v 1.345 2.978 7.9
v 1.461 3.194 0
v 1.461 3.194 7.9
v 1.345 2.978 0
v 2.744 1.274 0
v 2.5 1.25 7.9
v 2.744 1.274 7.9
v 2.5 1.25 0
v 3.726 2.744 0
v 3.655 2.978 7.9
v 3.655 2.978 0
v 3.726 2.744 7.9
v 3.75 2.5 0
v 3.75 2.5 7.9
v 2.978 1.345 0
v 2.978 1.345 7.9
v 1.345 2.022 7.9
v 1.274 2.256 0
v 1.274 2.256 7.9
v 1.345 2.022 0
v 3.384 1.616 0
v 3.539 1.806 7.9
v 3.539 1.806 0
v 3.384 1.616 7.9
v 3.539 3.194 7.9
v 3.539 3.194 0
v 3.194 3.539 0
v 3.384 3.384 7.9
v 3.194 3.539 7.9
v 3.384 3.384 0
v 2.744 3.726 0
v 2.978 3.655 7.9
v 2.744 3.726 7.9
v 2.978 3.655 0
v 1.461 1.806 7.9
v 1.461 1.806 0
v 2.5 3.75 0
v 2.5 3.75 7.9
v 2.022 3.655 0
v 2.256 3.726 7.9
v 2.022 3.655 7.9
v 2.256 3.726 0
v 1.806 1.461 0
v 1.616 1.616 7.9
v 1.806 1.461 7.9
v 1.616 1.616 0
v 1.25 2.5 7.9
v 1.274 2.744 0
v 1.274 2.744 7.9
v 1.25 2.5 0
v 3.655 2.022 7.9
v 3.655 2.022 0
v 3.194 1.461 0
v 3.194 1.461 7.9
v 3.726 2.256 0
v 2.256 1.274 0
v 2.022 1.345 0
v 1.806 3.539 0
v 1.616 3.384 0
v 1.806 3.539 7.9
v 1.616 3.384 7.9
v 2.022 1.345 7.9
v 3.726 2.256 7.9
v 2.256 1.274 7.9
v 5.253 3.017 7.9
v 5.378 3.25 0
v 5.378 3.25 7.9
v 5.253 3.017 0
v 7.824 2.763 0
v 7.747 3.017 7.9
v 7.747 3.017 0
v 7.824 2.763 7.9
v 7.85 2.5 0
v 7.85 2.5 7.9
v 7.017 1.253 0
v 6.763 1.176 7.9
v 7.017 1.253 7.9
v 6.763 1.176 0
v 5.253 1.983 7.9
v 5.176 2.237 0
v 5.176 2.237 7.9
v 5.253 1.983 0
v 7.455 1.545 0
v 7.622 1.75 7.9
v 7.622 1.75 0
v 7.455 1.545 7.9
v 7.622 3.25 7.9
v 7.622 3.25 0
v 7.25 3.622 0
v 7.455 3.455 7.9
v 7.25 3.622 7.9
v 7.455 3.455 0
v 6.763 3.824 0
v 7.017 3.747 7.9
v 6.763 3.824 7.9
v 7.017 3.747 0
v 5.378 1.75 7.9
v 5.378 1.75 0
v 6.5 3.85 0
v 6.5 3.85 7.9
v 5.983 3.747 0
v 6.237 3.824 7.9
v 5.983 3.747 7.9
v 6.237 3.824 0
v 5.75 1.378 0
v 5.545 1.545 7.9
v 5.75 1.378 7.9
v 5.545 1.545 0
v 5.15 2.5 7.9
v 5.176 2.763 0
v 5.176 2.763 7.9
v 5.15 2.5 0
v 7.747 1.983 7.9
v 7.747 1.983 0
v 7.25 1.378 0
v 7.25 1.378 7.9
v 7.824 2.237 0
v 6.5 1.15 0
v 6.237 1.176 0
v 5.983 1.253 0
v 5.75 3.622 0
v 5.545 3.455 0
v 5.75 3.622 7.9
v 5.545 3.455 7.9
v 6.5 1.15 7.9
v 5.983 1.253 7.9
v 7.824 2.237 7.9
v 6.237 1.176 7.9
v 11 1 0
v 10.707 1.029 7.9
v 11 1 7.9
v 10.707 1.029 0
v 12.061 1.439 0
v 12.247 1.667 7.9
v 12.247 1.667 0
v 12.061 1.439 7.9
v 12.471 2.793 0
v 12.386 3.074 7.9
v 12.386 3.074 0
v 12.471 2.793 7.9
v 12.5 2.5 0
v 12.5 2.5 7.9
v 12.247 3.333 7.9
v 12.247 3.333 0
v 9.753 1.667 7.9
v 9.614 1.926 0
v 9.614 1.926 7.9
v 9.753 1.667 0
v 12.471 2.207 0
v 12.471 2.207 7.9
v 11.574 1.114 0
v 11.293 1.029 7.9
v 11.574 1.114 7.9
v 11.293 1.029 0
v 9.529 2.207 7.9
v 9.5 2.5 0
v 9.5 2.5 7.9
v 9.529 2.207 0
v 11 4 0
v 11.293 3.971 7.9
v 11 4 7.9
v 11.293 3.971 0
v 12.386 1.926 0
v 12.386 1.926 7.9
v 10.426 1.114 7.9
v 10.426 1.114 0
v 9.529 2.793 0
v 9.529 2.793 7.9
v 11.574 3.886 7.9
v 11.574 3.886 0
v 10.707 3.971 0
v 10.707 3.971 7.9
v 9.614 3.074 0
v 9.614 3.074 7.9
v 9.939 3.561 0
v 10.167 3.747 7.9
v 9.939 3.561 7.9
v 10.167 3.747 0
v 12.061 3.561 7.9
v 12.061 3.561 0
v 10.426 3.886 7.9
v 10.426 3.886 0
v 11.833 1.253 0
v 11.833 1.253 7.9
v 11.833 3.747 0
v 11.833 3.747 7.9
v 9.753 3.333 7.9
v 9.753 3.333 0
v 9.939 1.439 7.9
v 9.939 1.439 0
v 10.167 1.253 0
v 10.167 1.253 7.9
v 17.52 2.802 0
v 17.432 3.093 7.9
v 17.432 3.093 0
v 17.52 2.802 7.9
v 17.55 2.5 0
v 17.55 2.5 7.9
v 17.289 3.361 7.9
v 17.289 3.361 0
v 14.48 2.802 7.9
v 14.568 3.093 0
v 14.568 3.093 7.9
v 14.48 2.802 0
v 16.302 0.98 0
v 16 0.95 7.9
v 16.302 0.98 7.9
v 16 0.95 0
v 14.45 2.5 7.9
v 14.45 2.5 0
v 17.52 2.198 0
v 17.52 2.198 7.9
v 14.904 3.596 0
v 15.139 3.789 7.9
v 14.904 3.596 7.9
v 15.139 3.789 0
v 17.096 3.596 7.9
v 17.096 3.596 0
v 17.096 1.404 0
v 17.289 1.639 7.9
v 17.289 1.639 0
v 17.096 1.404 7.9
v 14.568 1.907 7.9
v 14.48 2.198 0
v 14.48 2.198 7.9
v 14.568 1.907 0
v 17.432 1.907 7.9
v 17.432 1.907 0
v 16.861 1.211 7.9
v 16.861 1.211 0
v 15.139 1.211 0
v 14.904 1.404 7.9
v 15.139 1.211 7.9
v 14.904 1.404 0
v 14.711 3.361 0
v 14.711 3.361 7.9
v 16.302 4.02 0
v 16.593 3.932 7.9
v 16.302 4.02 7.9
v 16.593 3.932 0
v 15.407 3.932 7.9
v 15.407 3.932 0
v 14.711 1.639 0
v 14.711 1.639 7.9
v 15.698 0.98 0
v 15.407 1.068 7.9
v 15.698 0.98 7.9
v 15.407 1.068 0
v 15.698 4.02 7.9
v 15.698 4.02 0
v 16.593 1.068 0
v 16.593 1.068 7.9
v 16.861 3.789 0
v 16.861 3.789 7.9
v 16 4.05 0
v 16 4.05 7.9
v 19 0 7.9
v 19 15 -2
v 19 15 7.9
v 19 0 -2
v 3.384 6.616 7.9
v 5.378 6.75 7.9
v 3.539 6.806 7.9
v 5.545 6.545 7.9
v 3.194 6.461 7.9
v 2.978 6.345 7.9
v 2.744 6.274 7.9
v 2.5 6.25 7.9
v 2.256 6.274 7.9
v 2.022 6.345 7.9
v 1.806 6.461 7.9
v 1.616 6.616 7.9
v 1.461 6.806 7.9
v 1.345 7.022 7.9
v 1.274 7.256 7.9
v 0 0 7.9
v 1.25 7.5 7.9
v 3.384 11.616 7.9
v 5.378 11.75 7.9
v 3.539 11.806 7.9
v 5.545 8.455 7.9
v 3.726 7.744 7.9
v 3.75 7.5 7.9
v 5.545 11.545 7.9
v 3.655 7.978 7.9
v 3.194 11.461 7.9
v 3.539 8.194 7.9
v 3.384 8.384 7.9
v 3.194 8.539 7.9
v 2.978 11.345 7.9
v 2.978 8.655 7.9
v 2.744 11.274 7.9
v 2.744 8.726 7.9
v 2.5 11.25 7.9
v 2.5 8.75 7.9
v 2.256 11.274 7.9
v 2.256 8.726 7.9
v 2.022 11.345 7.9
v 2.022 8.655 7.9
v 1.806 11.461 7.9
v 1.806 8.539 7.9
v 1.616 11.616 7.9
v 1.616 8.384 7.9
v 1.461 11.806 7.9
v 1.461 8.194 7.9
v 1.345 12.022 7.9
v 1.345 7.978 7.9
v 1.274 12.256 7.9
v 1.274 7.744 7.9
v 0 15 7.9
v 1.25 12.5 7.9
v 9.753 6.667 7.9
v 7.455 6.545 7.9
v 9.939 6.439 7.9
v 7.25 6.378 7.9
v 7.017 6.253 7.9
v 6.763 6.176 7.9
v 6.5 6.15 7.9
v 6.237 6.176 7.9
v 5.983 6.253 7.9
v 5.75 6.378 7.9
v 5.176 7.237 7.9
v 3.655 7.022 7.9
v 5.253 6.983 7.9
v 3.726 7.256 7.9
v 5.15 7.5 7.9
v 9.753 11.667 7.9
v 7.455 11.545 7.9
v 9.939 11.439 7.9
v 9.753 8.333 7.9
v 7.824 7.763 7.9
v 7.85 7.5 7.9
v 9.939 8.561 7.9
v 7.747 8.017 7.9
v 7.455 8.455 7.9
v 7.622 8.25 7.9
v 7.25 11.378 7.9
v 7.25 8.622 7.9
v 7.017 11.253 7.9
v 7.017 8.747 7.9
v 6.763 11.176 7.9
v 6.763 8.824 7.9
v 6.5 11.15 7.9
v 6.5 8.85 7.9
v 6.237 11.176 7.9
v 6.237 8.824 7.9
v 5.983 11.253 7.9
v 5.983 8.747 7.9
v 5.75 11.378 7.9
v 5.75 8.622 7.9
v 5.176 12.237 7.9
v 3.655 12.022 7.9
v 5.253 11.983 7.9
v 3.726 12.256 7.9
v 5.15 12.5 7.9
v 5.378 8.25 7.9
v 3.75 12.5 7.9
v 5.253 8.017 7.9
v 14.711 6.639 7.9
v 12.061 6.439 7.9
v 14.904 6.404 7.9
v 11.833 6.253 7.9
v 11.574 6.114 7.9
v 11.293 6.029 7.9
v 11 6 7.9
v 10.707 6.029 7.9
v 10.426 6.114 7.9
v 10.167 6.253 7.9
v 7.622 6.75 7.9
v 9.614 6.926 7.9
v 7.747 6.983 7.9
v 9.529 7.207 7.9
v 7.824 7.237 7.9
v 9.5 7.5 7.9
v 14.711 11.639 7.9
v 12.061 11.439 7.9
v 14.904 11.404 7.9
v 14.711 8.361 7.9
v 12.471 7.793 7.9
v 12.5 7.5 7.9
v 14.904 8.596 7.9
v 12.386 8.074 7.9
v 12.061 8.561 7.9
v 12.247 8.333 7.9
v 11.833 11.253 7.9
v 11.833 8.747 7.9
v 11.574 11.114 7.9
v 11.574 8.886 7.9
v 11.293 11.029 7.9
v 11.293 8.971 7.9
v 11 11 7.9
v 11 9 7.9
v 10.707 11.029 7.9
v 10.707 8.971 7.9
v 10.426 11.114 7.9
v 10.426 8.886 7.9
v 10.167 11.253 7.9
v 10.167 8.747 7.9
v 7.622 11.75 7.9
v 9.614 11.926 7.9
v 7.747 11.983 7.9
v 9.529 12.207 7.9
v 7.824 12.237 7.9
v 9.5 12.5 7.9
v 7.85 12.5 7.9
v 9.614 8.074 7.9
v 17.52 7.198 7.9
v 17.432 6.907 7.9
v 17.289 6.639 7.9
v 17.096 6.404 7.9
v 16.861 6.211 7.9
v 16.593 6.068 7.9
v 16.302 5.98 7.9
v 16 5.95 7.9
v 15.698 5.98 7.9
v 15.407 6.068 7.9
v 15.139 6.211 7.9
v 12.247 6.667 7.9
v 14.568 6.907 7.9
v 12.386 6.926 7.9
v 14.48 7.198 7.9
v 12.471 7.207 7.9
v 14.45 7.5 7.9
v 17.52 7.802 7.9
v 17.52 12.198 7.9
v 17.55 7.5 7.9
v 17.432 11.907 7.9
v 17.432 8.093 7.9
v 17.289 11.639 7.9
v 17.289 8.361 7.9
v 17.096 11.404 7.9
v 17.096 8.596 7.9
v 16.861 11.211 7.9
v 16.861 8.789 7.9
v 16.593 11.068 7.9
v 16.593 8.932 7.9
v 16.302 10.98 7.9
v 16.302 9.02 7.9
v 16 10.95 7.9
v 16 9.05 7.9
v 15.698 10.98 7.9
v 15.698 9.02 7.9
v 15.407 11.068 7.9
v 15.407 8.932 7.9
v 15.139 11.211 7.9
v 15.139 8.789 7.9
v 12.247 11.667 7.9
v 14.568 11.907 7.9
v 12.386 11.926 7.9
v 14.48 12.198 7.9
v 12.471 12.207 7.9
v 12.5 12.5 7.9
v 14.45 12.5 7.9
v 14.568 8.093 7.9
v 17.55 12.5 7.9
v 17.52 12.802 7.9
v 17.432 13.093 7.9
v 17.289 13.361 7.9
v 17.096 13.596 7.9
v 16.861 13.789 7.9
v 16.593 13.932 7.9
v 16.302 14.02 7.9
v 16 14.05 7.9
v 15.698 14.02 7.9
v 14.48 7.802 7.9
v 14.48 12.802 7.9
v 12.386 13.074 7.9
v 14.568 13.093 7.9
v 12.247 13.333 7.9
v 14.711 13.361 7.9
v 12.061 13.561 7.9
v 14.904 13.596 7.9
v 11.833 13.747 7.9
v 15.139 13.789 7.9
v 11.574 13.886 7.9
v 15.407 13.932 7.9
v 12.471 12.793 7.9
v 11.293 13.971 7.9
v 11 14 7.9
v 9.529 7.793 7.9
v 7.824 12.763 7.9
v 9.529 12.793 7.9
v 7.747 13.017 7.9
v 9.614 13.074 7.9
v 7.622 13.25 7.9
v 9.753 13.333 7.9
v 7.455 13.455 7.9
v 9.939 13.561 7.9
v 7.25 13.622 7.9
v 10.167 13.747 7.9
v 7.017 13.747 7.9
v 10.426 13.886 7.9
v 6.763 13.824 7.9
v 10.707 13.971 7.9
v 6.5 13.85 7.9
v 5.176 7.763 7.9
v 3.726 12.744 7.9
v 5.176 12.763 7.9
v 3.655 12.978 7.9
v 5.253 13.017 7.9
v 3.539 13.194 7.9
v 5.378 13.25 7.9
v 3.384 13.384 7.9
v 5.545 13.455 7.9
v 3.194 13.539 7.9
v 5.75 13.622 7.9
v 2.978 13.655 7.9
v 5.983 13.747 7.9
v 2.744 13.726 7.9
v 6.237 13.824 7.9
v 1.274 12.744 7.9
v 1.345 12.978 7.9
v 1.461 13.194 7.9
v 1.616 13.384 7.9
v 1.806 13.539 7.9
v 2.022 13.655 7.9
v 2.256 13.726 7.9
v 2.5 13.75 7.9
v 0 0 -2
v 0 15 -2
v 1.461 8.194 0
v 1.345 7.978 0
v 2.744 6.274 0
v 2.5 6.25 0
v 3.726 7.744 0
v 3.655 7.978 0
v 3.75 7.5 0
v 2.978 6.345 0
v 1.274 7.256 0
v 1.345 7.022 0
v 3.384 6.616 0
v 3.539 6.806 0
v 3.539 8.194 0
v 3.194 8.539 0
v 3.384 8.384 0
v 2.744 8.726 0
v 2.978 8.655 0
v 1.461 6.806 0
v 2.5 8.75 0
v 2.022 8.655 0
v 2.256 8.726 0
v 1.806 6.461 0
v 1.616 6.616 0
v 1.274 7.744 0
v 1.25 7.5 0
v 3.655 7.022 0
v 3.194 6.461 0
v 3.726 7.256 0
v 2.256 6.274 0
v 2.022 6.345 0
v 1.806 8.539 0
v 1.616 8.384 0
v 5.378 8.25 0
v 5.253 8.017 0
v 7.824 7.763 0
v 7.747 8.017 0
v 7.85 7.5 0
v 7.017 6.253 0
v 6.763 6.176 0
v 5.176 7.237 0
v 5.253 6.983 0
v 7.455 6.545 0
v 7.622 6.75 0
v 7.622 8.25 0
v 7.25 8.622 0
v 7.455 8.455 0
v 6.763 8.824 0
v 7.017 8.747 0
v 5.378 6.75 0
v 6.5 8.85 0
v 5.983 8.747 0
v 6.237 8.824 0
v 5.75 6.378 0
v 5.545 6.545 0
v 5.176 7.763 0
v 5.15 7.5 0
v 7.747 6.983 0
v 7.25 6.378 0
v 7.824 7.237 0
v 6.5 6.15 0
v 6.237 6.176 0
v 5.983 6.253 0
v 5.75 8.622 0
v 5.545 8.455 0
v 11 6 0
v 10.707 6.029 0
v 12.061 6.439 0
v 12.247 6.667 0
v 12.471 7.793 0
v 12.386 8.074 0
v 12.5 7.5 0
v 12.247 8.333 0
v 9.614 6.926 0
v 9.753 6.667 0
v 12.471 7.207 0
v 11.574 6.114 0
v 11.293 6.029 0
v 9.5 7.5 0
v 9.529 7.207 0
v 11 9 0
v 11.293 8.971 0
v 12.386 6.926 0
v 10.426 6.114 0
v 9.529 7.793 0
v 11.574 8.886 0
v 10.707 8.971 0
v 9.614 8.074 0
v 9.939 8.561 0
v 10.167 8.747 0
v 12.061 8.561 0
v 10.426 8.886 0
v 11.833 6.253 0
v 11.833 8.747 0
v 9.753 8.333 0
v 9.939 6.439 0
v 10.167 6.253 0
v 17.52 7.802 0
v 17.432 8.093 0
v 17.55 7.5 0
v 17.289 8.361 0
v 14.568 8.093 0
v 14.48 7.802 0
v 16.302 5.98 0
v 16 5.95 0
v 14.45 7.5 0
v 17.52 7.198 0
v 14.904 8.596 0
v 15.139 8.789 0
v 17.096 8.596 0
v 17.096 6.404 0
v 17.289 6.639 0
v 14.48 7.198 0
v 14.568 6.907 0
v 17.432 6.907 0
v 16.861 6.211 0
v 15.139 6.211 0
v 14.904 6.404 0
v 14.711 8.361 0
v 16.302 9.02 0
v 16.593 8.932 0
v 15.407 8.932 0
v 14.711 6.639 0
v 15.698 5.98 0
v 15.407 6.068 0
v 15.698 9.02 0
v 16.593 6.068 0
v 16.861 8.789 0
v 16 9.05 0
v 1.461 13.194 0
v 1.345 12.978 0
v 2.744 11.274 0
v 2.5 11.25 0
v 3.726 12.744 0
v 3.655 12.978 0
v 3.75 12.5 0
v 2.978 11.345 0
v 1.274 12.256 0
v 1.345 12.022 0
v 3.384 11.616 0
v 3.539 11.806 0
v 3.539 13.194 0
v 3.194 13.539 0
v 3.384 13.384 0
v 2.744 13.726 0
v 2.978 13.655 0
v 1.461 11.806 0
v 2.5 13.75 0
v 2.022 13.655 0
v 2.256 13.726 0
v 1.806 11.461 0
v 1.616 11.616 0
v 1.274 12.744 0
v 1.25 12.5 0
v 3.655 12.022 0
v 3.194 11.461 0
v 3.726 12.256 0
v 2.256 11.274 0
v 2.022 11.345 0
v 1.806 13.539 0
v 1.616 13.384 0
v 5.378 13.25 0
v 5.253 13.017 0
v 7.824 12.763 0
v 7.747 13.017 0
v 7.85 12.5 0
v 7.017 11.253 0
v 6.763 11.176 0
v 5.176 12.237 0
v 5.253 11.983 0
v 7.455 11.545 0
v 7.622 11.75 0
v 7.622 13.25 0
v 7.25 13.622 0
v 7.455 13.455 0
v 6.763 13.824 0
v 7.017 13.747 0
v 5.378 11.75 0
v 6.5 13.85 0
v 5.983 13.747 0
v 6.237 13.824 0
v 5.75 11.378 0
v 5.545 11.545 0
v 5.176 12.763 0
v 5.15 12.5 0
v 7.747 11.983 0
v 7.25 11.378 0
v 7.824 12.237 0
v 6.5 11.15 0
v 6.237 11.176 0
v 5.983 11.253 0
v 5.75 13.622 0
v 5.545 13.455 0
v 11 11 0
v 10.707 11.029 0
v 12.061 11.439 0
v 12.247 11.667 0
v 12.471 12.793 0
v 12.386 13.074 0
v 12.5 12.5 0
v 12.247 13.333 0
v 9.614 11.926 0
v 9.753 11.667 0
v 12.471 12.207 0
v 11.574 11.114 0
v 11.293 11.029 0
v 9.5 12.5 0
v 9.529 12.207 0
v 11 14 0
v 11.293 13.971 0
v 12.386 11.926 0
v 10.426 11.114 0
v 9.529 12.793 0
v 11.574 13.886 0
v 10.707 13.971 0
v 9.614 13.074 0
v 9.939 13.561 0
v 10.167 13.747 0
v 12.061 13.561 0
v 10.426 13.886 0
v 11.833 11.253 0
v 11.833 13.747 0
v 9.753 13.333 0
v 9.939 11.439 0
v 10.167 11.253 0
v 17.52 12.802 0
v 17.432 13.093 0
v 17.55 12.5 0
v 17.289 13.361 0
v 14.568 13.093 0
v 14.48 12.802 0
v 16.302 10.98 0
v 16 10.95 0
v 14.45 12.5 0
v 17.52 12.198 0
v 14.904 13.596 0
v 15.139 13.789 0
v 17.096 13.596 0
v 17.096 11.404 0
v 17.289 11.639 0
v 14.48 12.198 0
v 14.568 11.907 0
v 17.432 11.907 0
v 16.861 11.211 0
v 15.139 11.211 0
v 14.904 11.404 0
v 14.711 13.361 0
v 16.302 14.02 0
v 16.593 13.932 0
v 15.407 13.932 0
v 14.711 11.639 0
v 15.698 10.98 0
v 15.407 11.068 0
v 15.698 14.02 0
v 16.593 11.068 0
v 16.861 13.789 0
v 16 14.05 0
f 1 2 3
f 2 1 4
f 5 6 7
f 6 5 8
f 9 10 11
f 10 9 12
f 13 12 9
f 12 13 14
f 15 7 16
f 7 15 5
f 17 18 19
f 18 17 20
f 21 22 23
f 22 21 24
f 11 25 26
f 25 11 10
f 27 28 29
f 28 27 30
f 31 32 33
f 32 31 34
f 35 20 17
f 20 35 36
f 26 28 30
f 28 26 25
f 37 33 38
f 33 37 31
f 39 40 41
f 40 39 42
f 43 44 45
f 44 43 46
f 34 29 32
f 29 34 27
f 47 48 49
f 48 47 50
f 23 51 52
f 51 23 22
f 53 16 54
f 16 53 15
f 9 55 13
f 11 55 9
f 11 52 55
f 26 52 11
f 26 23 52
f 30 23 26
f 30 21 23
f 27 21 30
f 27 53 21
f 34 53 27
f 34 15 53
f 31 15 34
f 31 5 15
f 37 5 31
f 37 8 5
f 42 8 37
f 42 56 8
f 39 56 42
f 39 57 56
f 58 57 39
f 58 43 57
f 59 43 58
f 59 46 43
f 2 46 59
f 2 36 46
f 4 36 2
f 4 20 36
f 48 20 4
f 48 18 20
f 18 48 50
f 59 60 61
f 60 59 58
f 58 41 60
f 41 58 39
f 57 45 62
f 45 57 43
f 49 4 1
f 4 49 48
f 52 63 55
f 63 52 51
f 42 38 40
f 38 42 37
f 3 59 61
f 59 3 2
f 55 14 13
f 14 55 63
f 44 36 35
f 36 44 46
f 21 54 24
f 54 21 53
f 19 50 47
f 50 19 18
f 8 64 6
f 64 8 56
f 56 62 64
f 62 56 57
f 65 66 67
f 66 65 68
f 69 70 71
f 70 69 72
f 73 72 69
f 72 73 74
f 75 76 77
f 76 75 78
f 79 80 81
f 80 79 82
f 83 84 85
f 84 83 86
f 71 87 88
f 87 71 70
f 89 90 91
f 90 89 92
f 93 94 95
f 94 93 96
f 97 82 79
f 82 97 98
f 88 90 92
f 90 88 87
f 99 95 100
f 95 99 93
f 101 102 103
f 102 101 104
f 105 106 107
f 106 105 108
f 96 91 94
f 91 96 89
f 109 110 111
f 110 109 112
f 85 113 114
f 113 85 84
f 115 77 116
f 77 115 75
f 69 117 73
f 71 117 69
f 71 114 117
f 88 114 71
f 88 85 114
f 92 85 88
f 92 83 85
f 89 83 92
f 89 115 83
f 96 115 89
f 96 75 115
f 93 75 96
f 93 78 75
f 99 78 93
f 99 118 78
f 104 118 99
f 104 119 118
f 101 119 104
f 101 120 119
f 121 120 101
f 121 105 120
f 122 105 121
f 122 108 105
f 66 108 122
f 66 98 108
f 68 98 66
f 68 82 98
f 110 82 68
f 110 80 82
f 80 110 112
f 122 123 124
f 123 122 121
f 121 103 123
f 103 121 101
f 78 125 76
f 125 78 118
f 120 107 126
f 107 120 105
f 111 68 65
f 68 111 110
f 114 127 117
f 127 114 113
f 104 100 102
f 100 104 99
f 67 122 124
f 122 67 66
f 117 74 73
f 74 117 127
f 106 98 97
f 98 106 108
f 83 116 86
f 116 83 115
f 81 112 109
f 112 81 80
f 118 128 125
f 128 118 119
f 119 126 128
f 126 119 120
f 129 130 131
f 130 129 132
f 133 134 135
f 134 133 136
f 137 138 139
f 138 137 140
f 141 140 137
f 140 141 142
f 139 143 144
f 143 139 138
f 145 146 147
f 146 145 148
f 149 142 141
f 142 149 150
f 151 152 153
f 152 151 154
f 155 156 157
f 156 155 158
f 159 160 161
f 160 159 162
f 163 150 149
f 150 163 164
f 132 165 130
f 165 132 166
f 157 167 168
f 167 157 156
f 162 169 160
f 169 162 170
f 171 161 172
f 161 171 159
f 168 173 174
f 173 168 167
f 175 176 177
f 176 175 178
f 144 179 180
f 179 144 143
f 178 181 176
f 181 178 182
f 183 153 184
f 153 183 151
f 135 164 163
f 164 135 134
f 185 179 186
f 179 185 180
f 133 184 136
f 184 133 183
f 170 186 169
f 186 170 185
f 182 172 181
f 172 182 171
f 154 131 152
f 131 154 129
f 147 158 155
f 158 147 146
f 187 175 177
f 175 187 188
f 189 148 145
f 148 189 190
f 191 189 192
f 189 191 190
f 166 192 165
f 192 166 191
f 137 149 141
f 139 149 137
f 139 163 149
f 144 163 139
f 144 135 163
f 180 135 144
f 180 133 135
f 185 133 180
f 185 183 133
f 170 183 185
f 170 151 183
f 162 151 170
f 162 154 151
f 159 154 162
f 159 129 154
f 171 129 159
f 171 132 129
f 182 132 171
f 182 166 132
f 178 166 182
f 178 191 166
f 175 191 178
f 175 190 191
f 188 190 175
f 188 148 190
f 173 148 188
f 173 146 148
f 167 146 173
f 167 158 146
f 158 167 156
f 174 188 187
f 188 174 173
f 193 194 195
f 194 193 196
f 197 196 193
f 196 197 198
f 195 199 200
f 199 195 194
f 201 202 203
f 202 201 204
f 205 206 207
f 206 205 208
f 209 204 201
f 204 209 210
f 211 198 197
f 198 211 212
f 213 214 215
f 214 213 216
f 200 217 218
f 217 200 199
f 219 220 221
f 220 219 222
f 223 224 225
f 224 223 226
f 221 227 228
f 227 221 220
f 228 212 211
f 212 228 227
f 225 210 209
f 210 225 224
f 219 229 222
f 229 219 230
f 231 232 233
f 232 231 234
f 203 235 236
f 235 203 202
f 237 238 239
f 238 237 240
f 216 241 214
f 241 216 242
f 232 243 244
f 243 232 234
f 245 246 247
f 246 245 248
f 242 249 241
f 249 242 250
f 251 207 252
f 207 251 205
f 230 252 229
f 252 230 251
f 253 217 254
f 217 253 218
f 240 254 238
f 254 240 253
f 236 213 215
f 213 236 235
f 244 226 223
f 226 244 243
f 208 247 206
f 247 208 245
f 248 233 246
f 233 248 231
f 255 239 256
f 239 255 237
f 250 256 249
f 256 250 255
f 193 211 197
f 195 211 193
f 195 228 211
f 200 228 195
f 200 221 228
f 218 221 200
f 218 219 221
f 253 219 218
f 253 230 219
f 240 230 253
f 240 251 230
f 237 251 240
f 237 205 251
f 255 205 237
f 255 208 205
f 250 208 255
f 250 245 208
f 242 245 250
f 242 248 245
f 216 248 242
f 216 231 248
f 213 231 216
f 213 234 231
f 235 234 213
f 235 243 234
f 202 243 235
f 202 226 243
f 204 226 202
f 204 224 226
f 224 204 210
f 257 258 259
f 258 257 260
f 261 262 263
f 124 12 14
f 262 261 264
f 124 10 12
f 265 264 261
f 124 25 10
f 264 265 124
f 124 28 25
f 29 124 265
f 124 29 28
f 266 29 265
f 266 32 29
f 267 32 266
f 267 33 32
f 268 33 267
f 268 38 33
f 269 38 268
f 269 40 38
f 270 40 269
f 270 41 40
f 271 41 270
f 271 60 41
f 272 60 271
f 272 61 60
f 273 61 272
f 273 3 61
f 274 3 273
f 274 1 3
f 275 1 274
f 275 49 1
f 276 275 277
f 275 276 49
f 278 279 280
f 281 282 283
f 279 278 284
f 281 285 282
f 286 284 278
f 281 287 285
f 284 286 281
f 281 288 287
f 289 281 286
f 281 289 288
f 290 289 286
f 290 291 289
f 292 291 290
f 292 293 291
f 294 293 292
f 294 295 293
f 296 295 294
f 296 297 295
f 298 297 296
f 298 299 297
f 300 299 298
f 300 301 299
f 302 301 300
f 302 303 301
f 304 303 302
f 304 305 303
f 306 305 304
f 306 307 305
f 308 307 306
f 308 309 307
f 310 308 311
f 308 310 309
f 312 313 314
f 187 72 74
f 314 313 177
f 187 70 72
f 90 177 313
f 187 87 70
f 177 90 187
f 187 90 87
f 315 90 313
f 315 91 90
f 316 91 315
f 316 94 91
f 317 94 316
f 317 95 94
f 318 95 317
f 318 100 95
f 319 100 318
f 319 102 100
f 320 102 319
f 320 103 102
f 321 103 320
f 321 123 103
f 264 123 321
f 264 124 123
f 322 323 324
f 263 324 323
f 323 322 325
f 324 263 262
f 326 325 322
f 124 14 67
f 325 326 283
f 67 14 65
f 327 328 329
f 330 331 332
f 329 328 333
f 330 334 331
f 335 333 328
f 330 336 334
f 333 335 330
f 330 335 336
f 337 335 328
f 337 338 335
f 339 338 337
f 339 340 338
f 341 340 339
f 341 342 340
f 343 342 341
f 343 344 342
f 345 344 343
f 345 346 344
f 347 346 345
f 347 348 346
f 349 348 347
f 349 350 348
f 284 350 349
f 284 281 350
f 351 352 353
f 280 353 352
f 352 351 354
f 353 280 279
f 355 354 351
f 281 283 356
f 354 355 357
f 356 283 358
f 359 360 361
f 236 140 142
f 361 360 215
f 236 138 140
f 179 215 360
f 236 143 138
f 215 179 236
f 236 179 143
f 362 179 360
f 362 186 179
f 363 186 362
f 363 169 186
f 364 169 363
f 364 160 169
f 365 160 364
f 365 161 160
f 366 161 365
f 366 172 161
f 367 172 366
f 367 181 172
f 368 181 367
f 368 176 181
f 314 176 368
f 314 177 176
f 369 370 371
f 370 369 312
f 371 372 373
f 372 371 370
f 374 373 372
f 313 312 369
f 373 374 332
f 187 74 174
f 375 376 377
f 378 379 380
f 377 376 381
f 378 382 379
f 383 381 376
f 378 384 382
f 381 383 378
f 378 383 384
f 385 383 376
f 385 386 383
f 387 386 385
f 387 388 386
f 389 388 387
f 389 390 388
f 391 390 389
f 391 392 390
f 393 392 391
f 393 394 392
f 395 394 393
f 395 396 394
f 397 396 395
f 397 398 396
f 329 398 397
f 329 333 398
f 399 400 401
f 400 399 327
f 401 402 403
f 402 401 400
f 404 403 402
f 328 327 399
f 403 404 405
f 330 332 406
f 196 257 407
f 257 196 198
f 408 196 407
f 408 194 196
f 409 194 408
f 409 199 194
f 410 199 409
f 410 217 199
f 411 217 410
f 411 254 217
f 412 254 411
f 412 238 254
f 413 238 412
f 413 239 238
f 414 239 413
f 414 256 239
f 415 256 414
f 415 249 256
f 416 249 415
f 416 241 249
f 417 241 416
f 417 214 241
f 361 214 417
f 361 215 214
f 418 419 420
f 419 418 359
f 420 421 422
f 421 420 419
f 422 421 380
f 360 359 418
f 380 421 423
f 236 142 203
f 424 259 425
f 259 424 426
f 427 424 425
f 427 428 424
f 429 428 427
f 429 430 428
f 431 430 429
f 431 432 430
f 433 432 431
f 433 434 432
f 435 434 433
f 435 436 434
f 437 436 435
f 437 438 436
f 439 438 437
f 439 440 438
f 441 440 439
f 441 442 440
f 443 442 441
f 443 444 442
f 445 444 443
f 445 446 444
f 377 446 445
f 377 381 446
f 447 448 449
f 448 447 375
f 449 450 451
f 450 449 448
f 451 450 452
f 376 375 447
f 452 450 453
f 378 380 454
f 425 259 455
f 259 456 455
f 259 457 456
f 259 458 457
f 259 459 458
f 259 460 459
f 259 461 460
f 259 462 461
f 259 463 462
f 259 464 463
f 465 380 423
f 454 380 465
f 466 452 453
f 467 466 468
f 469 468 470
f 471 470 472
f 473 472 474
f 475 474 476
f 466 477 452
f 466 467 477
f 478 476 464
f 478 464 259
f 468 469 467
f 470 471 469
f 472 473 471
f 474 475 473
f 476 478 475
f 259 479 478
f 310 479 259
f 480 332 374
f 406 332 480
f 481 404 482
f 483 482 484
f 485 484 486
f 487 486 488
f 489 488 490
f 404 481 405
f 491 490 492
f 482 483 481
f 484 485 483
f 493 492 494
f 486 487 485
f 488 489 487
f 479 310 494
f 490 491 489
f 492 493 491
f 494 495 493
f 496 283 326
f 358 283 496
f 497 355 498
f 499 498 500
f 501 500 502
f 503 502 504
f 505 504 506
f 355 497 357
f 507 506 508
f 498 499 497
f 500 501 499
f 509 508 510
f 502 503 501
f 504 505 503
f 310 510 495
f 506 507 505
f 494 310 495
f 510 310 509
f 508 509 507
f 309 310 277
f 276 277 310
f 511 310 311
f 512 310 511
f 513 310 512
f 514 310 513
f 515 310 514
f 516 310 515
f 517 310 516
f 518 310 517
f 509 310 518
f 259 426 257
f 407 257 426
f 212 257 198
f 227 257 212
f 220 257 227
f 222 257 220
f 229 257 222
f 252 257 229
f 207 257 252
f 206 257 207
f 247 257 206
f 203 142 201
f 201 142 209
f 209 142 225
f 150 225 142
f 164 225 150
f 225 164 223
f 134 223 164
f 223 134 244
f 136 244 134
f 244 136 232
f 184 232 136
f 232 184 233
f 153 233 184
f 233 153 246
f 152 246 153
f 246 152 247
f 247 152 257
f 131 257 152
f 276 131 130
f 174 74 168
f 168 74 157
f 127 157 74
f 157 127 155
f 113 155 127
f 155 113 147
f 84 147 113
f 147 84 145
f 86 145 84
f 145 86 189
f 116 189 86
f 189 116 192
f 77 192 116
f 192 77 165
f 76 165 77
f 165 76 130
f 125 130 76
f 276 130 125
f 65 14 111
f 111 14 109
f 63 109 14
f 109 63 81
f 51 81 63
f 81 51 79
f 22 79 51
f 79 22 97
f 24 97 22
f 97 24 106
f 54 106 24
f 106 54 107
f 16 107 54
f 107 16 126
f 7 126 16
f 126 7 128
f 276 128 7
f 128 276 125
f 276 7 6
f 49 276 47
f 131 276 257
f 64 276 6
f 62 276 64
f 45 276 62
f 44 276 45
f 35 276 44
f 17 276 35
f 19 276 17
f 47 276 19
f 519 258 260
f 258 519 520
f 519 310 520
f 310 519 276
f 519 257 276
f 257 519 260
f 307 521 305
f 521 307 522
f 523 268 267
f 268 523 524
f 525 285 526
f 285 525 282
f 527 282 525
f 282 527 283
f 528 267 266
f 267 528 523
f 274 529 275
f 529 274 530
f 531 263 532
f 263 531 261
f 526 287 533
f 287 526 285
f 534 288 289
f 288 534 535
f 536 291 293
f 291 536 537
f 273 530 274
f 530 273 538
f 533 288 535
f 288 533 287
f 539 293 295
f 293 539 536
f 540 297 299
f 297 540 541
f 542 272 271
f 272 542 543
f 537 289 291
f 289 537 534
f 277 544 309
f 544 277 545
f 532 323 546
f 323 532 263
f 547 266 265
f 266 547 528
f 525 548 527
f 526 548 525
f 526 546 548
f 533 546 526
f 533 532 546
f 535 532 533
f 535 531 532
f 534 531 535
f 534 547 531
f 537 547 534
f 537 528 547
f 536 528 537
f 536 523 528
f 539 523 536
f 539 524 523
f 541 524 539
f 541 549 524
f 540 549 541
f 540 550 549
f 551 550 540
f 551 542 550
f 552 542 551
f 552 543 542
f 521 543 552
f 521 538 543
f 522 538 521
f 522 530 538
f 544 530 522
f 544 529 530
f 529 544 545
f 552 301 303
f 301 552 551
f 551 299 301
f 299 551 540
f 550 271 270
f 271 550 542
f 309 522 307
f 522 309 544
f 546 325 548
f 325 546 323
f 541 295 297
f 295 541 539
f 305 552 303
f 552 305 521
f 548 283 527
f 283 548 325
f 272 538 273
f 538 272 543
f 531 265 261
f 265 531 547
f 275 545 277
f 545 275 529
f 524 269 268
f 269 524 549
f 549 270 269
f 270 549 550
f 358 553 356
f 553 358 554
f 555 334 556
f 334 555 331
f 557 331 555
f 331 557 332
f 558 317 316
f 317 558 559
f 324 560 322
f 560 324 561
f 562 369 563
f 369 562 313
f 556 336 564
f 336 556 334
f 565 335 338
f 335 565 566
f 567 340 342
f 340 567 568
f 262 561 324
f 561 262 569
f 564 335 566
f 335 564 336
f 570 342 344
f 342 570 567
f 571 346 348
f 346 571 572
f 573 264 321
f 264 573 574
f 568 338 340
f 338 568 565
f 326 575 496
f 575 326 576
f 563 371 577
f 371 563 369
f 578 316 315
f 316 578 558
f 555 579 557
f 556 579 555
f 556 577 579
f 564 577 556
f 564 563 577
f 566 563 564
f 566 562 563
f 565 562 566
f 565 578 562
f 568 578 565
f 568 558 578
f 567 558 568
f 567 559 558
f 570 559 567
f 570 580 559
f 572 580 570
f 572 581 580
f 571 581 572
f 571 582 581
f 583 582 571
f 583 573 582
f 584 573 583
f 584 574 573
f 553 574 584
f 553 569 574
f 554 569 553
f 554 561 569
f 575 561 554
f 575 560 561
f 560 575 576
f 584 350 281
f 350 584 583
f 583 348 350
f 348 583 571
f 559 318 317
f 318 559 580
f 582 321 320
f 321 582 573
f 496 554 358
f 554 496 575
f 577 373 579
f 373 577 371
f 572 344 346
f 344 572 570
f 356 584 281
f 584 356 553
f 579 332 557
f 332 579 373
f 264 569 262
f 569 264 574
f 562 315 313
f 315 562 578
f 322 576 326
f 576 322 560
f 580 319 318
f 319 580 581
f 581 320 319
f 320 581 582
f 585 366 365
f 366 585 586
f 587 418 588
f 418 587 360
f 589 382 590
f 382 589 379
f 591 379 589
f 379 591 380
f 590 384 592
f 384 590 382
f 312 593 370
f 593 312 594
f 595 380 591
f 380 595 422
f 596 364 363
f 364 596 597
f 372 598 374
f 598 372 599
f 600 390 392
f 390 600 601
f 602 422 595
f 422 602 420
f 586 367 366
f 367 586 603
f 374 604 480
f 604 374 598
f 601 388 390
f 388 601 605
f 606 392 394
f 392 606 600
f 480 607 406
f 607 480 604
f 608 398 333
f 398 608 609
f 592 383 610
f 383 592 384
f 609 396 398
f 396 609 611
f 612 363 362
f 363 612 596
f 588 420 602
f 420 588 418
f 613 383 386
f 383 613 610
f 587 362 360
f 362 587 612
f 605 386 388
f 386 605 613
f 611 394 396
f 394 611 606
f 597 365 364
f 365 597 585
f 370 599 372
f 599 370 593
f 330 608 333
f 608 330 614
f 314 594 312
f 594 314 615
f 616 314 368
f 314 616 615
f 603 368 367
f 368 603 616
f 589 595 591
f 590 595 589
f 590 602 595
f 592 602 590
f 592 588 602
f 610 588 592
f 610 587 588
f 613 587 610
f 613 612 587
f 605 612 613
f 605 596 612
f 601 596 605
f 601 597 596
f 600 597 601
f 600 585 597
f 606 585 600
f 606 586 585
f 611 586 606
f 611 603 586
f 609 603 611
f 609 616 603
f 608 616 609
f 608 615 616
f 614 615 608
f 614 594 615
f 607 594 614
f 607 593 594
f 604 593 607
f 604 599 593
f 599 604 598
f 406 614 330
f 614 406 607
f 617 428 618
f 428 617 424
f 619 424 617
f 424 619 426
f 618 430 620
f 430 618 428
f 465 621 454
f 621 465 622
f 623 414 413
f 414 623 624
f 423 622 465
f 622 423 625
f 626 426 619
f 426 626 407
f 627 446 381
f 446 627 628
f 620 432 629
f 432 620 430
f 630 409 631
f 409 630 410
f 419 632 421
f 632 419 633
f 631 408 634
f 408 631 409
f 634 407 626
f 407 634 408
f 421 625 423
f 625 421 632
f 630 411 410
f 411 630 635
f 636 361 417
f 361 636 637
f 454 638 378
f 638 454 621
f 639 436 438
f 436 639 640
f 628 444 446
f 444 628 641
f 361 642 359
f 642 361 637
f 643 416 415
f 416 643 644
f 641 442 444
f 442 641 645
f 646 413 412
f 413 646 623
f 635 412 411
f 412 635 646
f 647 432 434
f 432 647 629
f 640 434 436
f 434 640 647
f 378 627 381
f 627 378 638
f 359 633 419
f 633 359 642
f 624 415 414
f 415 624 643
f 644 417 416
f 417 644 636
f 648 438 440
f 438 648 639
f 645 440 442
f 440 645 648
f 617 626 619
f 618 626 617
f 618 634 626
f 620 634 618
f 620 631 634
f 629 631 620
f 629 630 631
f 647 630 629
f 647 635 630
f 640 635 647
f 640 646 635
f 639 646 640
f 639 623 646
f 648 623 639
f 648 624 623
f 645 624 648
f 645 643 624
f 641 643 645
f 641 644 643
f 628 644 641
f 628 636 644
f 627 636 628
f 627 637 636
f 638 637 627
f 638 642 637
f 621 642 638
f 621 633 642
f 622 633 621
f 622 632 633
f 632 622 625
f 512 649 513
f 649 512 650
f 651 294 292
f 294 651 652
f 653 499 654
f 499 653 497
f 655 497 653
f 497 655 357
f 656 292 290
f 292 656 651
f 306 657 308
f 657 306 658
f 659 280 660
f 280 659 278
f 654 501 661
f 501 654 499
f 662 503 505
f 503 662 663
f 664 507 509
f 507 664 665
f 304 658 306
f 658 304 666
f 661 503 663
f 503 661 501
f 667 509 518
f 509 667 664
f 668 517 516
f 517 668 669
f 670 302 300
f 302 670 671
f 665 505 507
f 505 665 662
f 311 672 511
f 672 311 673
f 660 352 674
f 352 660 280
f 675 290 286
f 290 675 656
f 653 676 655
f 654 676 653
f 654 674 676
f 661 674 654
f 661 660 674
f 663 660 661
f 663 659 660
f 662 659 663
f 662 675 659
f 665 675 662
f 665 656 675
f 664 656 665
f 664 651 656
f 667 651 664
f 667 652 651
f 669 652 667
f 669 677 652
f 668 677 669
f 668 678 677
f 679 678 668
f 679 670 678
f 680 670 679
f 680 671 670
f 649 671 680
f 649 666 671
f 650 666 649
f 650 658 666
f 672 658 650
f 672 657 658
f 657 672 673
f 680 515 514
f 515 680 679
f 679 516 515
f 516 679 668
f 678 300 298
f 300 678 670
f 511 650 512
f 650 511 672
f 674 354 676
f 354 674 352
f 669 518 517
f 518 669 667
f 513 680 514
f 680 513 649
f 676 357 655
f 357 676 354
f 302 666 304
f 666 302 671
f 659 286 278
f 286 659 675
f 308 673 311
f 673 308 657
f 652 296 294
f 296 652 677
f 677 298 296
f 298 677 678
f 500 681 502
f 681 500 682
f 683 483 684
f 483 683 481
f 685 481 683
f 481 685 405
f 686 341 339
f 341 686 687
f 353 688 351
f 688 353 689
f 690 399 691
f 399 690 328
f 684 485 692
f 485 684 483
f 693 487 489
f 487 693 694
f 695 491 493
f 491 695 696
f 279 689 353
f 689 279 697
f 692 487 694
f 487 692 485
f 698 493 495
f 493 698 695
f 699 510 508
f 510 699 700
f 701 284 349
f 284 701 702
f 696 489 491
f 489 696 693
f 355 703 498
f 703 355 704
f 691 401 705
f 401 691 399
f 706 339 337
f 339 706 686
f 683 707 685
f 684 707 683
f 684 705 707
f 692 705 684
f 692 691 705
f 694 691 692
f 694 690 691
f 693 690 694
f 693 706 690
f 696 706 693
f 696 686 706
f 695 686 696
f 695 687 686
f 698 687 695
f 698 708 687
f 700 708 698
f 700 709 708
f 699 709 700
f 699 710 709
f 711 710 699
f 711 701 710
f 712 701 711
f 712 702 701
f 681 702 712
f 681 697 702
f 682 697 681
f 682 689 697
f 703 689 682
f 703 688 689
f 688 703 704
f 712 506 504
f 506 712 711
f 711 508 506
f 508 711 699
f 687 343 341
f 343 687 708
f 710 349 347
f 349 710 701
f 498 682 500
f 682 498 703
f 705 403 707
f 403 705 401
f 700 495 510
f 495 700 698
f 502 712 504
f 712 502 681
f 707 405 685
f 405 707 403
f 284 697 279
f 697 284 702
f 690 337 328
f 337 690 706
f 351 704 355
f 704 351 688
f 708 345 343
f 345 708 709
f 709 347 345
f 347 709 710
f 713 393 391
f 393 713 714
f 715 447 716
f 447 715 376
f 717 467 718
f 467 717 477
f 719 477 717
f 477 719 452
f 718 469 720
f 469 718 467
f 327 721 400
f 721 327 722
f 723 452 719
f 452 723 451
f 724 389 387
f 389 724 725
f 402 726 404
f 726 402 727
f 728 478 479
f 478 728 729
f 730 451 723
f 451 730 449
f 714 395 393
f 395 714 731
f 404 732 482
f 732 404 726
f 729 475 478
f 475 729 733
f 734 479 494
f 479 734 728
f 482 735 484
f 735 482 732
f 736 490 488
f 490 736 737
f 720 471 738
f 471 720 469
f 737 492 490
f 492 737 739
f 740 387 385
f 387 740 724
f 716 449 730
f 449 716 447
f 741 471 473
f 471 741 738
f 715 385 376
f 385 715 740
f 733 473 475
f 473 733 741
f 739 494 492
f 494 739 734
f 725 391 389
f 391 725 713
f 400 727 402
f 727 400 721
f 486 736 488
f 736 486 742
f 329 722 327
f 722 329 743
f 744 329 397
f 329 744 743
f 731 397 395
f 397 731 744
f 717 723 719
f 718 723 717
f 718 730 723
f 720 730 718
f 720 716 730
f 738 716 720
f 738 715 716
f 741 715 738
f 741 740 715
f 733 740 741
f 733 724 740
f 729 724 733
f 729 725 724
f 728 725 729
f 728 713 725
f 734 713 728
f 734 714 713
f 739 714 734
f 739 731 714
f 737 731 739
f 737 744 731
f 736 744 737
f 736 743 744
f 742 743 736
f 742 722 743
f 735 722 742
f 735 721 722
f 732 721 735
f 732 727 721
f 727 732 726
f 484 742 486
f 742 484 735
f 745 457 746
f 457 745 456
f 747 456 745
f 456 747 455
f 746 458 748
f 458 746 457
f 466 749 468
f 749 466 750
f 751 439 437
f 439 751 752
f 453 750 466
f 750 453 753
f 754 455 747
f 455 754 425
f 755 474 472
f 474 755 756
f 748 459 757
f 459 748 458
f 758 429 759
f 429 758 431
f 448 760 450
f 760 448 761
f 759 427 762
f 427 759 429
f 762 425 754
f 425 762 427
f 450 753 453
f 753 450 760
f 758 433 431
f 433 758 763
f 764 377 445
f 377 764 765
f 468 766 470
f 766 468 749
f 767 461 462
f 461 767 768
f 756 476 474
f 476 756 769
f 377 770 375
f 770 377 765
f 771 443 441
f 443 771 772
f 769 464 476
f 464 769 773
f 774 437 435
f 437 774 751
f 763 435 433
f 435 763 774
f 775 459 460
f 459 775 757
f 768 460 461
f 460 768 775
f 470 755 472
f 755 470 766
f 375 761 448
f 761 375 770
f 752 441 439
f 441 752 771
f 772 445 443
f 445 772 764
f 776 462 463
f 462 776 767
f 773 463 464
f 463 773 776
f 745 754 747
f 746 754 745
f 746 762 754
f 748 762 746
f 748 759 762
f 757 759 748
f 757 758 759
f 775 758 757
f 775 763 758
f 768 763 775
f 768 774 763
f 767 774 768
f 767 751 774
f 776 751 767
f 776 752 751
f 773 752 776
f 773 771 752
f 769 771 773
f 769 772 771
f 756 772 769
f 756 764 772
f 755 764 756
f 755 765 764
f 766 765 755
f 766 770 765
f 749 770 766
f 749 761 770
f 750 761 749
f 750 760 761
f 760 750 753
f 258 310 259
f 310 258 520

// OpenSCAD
$fn = 32;  
h = 8;
w = 5;

for(i = [0 : 1 : 2]) {
  translate([0, i * w, 0])
    difference() {
      translate([0, 0, -2])
        cube([19, w, h + 2 - 0.1]);

        translate([w / 2, w / 2, 0]) {
          translate([0, 0, 0])
            cylinder(h, d = 2.5);
          
          translate([4, 0, 0])
            cylinder(h, d = 2.7);
          
          translate([8.5, 0, 0])
            cylinder(h, d = 3);
          
          translate([13.5, 0, 0])
            cylinder(h, d = 3.1);
        }
    }
}
